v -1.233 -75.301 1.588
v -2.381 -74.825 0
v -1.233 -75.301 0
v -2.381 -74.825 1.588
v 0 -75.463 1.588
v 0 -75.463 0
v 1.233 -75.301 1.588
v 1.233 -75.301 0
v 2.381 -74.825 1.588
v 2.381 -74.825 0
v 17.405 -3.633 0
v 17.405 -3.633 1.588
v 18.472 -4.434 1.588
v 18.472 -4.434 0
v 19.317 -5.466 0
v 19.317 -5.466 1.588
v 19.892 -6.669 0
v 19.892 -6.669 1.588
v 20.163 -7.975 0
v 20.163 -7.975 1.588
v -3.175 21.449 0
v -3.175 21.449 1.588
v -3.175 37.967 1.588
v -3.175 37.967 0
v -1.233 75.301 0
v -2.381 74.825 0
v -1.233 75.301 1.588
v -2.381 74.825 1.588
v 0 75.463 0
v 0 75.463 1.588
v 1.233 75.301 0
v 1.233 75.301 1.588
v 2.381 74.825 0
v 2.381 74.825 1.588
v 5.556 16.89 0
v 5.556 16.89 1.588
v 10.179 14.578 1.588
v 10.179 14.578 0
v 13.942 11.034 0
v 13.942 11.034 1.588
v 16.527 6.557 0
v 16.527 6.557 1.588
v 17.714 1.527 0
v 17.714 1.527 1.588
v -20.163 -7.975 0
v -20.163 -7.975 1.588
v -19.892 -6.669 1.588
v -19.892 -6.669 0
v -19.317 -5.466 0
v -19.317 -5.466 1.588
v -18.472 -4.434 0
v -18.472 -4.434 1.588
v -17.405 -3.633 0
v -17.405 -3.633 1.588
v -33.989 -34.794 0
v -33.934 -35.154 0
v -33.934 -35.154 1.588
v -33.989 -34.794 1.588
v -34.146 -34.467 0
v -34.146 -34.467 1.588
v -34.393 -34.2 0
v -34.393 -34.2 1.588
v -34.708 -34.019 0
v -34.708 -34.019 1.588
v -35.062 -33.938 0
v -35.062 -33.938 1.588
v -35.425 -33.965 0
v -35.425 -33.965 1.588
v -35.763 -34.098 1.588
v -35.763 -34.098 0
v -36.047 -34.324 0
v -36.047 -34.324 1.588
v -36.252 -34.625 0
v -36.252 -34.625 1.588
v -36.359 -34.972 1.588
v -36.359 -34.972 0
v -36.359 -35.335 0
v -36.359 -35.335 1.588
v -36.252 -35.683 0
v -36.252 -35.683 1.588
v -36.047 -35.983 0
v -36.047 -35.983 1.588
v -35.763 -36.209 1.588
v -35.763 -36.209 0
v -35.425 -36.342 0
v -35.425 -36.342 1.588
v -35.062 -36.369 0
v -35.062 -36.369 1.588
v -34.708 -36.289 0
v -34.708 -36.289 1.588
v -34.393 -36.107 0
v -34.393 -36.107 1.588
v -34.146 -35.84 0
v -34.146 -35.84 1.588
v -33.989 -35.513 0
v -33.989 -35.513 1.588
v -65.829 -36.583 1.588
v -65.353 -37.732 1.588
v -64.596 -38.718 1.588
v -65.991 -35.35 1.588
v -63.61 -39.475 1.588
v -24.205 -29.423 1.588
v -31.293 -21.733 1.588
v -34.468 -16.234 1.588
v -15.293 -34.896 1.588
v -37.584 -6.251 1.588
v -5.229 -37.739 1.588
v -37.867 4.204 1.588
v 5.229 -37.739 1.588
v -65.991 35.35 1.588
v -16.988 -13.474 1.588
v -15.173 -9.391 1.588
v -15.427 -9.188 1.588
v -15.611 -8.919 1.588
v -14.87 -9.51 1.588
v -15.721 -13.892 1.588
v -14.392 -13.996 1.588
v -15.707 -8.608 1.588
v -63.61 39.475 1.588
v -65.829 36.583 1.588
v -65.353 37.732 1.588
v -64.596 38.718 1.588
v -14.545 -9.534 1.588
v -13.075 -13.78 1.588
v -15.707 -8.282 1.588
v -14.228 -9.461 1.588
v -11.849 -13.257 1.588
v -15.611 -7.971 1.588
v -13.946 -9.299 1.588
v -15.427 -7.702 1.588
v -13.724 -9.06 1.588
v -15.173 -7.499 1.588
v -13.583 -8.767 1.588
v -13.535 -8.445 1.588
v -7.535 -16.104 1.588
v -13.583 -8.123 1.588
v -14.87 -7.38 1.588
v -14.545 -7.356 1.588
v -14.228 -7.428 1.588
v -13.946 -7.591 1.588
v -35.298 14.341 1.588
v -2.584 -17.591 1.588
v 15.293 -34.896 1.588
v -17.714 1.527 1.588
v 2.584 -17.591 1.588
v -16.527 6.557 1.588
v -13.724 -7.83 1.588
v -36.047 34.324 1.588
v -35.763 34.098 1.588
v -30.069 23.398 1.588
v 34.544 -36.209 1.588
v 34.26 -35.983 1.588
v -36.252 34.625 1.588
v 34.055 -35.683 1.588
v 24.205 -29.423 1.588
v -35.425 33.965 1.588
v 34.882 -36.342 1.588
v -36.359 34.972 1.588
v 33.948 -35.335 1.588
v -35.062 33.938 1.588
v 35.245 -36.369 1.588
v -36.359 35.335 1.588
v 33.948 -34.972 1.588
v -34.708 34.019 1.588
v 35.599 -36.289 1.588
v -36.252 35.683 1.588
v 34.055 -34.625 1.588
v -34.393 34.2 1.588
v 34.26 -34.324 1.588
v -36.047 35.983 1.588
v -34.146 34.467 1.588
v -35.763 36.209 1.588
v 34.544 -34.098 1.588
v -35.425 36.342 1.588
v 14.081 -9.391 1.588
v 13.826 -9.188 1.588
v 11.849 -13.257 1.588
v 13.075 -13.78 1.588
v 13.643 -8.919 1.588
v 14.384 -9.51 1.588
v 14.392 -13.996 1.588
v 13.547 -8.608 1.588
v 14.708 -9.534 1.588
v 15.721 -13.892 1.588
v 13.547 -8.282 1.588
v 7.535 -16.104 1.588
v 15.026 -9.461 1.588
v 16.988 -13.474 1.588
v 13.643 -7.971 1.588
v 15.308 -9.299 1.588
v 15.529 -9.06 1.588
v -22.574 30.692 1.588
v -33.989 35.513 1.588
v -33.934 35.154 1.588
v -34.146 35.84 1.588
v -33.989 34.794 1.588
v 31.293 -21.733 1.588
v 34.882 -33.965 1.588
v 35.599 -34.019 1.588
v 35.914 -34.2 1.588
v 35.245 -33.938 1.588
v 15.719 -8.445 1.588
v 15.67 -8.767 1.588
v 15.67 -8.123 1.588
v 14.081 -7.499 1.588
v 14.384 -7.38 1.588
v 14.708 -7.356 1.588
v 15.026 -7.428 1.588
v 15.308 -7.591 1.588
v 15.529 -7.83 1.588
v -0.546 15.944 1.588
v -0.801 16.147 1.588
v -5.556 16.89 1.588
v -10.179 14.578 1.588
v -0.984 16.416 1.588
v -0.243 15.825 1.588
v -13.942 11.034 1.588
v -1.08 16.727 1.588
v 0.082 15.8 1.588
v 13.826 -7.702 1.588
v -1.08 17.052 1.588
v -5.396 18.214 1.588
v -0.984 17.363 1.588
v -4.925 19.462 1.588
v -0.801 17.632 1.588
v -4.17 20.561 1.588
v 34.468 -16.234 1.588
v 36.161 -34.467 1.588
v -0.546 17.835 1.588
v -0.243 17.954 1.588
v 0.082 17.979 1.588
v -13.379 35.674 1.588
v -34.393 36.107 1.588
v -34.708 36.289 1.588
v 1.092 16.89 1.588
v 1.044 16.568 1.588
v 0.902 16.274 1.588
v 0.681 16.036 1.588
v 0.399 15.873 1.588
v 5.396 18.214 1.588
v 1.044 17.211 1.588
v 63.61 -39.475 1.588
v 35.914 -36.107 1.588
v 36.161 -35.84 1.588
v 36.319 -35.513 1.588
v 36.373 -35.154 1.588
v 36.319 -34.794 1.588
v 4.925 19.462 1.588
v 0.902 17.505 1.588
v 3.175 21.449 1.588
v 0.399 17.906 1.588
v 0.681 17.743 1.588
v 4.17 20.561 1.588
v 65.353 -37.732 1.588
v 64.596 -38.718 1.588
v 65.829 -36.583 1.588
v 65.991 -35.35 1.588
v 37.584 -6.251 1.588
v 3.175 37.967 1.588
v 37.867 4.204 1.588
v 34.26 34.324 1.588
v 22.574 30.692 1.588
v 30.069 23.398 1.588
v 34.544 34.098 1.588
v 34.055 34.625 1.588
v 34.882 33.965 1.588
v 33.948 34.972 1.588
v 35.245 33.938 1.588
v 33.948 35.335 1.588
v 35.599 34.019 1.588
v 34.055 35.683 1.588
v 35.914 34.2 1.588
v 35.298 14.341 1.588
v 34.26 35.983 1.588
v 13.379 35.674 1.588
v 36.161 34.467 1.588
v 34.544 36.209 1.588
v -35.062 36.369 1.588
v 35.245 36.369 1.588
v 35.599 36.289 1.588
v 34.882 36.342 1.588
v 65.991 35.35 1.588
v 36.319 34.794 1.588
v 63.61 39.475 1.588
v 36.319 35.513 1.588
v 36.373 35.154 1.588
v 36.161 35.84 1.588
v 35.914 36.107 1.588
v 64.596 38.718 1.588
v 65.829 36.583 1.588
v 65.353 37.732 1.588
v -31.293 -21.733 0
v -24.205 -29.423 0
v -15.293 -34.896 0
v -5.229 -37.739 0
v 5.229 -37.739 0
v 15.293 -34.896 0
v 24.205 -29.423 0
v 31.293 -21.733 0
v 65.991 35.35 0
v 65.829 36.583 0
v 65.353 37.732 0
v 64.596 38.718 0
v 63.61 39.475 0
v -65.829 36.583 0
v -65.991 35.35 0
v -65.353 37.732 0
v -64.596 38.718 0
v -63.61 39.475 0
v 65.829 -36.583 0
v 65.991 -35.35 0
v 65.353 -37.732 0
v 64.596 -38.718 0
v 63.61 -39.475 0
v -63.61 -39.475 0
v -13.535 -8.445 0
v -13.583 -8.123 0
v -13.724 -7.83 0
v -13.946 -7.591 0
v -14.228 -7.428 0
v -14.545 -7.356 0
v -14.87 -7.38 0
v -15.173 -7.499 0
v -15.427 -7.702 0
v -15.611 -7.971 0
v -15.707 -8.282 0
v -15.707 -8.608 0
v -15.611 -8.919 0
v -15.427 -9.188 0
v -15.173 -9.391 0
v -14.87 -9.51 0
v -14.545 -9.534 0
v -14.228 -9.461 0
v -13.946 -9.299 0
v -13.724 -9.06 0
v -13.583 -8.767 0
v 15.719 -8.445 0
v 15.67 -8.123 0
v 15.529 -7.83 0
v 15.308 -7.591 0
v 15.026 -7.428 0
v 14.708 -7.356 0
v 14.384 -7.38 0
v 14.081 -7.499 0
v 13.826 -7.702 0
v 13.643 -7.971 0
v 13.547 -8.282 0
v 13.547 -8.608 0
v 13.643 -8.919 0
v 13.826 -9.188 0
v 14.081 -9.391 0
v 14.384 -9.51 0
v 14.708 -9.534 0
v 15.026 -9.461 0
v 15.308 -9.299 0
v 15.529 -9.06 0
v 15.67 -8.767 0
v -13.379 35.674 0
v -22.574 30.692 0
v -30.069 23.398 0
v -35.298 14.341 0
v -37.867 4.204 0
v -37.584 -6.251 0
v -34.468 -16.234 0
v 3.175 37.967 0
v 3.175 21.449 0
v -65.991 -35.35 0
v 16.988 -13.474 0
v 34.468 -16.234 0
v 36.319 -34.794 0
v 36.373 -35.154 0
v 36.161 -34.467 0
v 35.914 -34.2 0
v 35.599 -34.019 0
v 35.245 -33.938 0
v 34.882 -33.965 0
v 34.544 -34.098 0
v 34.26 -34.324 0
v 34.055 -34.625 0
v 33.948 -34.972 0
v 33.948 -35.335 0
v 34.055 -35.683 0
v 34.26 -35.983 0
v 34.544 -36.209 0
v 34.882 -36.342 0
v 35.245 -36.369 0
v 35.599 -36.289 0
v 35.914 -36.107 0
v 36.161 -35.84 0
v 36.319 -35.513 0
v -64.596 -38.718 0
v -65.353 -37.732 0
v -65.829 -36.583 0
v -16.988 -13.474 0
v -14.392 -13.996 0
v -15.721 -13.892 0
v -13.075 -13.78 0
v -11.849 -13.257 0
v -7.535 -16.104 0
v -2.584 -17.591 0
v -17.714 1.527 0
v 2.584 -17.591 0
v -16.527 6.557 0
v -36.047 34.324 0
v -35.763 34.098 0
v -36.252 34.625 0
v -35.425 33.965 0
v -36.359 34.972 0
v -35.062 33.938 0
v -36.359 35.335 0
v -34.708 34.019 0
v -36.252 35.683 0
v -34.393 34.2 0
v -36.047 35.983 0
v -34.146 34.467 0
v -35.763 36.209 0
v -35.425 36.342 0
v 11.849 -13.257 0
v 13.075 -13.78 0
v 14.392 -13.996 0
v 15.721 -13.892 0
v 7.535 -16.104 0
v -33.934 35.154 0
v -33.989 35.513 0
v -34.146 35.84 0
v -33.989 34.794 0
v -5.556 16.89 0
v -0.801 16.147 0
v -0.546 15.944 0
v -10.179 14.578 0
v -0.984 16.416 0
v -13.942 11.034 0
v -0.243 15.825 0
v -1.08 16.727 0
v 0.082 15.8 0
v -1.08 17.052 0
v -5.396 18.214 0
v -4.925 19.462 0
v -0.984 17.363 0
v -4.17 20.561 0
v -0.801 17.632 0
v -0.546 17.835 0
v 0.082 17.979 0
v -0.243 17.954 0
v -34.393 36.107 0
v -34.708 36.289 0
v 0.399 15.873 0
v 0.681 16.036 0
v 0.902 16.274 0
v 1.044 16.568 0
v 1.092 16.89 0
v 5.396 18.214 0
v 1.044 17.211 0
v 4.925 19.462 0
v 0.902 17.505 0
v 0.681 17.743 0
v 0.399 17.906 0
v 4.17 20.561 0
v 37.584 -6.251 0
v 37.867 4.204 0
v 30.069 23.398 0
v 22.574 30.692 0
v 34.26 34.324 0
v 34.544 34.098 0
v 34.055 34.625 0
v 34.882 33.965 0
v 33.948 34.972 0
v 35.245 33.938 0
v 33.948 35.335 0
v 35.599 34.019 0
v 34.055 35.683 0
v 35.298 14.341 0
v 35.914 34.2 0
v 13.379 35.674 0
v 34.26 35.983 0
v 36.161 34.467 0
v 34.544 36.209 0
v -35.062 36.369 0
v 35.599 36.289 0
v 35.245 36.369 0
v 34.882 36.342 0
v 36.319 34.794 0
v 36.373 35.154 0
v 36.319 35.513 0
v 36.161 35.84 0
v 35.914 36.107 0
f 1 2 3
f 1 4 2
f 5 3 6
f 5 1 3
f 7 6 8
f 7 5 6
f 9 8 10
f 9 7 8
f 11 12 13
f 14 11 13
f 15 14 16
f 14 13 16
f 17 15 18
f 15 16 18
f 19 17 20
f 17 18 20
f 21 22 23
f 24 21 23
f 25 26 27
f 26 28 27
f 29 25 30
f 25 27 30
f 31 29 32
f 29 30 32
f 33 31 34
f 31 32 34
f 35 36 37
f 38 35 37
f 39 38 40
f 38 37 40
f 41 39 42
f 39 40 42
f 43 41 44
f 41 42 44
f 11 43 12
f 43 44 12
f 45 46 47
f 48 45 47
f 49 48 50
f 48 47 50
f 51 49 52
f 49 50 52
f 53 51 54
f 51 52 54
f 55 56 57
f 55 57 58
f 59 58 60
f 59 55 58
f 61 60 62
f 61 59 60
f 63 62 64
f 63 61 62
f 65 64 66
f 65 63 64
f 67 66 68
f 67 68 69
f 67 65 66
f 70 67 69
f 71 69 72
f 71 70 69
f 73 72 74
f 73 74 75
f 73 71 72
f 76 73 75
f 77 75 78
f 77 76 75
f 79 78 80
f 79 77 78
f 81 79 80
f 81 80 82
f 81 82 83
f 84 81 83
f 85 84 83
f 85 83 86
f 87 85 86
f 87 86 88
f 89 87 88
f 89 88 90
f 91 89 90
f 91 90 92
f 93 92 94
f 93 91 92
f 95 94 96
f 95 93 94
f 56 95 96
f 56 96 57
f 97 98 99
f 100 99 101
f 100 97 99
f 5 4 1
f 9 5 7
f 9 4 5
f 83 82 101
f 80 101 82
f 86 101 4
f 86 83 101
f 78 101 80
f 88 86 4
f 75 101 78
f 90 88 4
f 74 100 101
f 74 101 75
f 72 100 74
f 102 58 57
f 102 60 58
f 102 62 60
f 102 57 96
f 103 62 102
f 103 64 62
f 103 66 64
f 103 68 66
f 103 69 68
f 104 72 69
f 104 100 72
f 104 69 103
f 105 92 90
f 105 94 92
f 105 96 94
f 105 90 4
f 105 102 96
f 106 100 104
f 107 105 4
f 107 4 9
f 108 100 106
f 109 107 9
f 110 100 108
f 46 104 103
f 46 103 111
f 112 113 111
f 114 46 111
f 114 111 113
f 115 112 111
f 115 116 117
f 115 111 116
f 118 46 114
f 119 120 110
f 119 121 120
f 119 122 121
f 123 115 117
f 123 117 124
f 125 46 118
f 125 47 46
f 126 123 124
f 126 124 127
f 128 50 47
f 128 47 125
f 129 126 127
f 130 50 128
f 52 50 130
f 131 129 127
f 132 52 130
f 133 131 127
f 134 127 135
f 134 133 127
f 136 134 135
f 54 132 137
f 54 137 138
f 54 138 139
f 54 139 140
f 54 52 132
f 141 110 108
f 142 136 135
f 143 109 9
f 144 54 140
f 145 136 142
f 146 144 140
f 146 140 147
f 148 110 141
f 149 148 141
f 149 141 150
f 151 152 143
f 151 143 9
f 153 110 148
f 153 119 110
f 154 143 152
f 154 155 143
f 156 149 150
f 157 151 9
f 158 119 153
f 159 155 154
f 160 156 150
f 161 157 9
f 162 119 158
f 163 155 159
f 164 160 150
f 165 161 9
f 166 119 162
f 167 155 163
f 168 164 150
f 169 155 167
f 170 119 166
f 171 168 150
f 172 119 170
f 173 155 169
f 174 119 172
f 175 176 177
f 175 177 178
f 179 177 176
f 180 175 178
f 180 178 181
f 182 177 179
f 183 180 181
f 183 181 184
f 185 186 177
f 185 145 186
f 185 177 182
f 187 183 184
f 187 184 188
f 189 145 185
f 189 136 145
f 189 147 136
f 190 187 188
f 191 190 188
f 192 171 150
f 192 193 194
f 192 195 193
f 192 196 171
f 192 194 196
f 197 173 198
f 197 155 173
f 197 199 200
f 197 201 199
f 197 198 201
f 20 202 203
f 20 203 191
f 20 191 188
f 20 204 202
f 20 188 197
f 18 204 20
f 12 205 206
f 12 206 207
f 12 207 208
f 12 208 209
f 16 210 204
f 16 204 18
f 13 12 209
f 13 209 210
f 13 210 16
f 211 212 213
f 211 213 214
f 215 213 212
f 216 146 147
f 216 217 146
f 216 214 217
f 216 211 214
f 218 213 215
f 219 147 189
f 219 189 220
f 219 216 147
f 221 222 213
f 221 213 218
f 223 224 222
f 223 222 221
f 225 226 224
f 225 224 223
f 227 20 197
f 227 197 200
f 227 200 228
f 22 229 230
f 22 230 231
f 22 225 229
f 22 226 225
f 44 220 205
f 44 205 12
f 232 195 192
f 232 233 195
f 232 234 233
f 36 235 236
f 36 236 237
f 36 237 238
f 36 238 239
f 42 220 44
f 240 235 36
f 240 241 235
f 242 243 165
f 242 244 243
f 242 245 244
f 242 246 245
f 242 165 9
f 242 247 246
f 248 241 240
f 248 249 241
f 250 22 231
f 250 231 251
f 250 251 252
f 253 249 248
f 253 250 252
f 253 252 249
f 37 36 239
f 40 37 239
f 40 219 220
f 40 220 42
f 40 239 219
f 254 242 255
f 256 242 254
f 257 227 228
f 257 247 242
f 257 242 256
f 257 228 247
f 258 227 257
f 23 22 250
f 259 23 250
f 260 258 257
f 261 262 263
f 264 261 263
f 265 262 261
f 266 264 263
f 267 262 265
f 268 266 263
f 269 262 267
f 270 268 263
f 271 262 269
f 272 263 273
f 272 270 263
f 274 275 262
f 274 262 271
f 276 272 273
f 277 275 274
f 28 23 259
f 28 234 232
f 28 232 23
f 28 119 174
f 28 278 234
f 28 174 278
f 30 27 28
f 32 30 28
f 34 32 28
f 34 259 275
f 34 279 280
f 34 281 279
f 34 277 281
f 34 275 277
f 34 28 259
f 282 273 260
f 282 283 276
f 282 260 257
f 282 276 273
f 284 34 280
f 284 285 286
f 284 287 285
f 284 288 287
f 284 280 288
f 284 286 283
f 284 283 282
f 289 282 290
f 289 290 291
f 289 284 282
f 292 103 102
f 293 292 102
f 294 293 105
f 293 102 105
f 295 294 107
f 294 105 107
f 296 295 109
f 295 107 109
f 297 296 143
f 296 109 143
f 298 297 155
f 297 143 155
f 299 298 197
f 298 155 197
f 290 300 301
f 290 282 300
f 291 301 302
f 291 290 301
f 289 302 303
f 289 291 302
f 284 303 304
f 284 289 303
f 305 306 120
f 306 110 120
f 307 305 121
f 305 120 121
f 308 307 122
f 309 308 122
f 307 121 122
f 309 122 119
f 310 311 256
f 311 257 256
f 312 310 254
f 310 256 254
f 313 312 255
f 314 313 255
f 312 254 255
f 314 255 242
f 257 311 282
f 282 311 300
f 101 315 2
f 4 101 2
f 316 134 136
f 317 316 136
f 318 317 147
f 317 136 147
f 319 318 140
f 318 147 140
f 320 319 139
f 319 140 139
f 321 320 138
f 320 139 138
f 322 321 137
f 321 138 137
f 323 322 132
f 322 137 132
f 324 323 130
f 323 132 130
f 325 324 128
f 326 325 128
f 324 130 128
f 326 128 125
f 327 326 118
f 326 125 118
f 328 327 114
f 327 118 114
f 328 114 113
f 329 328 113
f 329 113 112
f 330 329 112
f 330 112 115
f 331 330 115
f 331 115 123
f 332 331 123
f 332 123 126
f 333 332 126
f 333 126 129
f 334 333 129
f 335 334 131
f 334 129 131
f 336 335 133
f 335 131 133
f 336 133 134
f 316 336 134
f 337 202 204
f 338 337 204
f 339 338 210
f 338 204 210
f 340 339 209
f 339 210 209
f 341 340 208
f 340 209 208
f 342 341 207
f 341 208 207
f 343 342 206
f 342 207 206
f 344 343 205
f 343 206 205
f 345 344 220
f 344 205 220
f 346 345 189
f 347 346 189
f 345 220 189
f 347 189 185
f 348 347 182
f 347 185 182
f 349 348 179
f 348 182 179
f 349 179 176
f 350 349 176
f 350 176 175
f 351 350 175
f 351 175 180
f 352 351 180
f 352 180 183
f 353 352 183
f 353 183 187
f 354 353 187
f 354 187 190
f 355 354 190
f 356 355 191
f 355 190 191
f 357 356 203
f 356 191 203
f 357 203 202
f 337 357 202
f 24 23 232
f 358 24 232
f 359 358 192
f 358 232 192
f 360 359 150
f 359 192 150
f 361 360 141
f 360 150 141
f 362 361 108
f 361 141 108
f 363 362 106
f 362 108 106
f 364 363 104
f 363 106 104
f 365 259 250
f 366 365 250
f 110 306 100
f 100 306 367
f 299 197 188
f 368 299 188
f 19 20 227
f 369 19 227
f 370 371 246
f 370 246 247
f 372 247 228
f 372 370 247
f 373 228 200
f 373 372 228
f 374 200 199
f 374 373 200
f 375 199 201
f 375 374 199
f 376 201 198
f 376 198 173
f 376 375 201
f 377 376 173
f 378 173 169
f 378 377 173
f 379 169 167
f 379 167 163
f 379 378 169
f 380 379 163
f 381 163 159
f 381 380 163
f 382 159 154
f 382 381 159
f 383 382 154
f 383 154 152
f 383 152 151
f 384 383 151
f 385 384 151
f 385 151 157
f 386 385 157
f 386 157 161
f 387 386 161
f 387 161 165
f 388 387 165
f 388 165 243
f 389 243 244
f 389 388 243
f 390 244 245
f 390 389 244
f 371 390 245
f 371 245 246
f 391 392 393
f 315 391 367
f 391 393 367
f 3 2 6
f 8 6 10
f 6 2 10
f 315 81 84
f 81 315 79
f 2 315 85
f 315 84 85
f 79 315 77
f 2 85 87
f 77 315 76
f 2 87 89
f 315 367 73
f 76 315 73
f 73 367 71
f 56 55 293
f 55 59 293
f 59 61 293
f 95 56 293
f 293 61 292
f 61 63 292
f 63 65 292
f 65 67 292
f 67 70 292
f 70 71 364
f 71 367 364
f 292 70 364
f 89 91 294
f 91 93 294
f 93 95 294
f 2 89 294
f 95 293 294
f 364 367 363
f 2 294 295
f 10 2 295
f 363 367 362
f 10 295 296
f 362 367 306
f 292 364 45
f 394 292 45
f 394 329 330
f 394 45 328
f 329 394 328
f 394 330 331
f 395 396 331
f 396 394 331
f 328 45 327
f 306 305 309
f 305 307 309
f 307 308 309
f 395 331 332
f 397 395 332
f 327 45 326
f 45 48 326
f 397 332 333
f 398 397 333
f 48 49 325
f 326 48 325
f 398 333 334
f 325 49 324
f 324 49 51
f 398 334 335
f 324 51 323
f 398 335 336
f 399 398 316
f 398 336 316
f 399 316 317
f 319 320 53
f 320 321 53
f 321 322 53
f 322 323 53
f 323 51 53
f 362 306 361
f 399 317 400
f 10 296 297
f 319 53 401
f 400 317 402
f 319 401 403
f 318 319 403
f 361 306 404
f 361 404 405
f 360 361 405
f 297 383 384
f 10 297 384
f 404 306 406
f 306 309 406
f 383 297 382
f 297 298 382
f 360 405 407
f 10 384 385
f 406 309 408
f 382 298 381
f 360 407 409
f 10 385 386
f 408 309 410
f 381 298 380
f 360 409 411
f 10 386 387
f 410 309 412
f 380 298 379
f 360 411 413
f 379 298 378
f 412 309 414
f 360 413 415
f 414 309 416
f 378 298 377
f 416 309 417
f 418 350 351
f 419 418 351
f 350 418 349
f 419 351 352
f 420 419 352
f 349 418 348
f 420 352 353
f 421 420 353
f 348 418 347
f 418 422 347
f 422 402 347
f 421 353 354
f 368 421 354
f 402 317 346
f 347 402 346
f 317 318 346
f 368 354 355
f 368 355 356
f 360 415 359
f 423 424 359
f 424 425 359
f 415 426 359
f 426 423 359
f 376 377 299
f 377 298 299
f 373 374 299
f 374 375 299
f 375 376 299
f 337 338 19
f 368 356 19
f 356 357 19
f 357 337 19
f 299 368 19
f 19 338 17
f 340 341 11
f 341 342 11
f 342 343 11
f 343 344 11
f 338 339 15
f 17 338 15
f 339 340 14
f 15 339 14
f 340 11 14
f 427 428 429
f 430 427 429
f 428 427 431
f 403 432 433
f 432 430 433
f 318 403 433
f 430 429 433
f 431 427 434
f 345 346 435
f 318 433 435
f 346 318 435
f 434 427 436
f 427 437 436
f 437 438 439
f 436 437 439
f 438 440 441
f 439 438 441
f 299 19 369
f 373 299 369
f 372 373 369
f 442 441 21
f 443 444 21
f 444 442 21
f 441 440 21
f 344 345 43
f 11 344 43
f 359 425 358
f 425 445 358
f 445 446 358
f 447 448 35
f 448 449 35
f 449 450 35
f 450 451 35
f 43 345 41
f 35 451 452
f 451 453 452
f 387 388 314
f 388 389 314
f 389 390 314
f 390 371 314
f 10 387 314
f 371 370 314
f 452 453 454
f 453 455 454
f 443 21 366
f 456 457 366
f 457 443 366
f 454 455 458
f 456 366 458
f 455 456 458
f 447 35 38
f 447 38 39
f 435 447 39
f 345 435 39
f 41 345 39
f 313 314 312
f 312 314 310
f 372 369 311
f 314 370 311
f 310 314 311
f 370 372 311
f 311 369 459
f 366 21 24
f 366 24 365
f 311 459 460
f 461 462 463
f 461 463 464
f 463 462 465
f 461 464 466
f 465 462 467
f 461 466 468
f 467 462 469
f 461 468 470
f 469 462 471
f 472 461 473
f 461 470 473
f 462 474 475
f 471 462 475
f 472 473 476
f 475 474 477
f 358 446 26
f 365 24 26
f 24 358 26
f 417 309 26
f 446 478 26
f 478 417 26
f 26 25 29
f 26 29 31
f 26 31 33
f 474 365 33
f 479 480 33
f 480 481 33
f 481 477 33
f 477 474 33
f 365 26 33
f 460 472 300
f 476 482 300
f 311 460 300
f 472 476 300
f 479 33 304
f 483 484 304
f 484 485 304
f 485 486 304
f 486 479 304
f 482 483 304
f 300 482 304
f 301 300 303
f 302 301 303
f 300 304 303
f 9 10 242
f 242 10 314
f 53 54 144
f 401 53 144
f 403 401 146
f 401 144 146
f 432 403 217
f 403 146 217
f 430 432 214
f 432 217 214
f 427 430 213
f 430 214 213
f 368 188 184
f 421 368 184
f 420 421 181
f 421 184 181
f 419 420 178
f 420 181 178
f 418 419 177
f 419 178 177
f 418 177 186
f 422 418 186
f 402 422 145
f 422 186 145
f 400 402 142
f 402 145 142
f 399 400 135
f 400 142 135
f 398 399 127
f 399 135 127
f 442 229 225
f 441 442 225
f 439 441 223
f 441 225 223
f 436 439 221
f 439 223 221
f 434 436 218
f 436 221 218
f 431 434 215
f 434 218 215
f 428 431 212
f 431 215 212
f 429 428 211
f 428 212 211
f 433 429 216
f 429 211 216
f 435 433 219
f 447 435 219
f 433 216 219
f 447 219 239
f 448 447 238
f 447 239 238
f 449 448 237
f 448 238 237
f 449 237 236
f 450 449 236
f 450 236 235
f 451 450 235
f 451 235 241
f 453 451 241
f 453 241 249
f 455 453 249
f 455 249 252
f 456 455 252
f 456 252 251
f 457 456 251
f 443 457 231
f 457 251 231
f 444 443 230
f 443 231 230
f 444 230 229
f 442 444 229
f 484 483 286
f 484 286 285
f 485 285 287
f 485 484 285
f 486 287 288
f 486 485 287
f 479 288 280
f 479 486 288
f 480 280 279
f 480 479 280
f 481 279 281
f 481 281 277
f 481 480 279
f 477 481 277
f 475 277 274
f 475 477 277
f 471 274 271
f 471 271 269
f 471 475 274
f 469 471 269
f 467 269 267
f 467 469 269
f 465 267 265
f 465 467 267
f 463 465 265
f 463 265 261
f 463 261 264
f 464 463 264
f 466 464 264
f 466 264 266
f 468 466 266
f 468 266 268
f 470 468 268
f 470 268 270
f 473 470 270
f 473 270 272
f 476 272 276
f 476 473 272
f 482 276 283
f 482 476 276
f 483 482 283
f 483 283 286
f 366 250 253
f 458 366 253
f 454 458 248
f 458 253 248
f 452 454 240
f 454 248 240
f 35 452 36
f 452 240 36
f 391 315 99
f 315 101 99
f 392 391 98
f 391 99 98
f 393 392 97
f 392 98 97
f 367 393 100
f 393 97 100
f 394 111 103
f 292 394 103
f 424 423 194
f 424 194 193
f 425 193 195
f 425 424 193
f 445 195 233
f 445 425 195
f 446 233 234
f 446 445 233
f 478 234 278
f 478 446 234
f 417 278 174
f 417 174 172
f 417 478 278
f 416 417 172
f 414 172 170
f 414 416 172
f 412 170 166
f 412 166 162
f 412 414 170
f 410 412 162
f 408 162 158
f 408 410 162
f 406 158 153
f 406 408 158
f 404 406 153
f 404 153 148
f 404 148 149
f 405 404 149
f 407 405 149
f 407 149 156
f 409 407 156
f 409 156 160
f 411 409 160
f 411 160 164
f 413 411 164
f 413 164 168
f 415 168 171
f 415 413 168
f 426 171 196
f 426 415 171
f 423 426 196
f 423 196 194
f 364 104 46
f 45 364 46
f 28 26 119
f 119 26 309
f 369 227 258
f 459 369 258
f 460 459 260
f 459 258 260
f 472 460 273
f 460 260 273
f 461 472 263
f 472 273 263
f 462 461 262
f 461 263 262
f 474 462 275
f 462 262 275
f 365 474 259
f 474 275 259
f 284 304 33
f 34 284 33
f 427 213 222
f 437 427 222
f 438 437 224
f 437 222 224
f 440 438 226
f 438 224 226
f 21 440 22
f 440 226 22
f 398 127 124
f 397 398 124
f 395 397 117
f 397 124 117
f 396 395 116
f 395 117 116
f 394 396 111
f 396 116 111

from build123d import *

# Parameters (mm, degrees)
F0_R            = 1.2192
F1_DEPTH        = 1.5875
F2_R            = 1.0922
F3_DEPTH        = 1.5875
F3_COPIES_COUNT = 3
F4_R            = 4.7625


# Not quite as in the source:
# - a pattern or mirror of a feature is missing from the dataset's text; its kind, count and spacing are read off the source's solid


with BuildPart() as f1:
    # F0 (on Top) → F1 (new body)
    with BuildSketch(Plane.XY):
        Polygon((65.9911357684, -38.1), (65.9911357684, 38.1), (0, 76.2), (-65.9911357684, 38.1), (-65.9911357684, -38.1), (0, -76.2), align=None)
        with Locations((-35.1536, -35.1536)):
            Circle(F0_R, mode=Mode.SUBTRACT)
        with Locations((35.1536, -35.1536)):
            Circle(F0_R, mode=Mode.SUBTRACT)
        with Locations((-35.1536, 35.1536)):
            Circle(F0_R, mode=Mode.SUBTRACT)
        with Locations((35.1536, 35.1536)):
            Circle(F0_R, mode=Mode.SUBTRACT)
    extrude(amount=F1_DEPTH)

    # F2 (on face) → F3 (cut, through all)
    with BuildSketch(Plane.XY.offset(1.5875)):
        with BuildLine():
            ThreePointArc((11.8486437632, -13.2566225326), (0, -17.78), (-11.8486437632, -13.2566225326))
            ThreePointArc((-11.8486437632, -13.2566225326), (-14.3916795622, -13.9960432527), (-16.9881251543, -13.4742728402))
            Line((-16.9881251543, -13.4742728402), (-31.2933003438, -21.7333695867))
            ThreePointArc((-31.2933003438, -21.7333695867), (0, -38.1), (31.2933003438, -21.7333695867))
            Line((31.2933003438, -21.7333695867), (16.9881251543, -13.4742728402))
            ThreePointArc((16.9881251543, -13.4742728402), (14.3916795622, -13.9960432527), (11.8486437632, -13.2566225326))
        make_face()
        with Locations((14.6267687632, -8.4447688828)):
            Circle(F2_R)
        with Locations((-14.6267687632, -8.4447688828)):
            Circle(F2_R)
    f3 = extrude(amount=-F3_DEPTH, mode=Mode.SUBTRACT)

    # F3_copies: F3 ×3 about axis
    f3_copies_axis = Axis((0, 0, 0), (0, 0, 1))
    for i in range(1, F3_COPIES_COUNT):
        add(f3.rotate(f3_copies_axis, i * 360 / F3_COPIES_COUNT), mode=Mode.SUBTRACT)

    # F4
    f4_edges = [f1.edges().sort_by_distance(p)[0] for p in [
        (-65.991136, 38.1, 0.79375),
        (0, 76.2, 0.79375),
        (65.991136, 38.1, 0.79375),
        (65.991136, -38.1, 0.79375),
        (0, -76.2, 0.79375),
        (-65.991136, -38.1, 0.79375),
    ]]
    fillet(f4_edges, radius=F4_R)


solid = f1.part
